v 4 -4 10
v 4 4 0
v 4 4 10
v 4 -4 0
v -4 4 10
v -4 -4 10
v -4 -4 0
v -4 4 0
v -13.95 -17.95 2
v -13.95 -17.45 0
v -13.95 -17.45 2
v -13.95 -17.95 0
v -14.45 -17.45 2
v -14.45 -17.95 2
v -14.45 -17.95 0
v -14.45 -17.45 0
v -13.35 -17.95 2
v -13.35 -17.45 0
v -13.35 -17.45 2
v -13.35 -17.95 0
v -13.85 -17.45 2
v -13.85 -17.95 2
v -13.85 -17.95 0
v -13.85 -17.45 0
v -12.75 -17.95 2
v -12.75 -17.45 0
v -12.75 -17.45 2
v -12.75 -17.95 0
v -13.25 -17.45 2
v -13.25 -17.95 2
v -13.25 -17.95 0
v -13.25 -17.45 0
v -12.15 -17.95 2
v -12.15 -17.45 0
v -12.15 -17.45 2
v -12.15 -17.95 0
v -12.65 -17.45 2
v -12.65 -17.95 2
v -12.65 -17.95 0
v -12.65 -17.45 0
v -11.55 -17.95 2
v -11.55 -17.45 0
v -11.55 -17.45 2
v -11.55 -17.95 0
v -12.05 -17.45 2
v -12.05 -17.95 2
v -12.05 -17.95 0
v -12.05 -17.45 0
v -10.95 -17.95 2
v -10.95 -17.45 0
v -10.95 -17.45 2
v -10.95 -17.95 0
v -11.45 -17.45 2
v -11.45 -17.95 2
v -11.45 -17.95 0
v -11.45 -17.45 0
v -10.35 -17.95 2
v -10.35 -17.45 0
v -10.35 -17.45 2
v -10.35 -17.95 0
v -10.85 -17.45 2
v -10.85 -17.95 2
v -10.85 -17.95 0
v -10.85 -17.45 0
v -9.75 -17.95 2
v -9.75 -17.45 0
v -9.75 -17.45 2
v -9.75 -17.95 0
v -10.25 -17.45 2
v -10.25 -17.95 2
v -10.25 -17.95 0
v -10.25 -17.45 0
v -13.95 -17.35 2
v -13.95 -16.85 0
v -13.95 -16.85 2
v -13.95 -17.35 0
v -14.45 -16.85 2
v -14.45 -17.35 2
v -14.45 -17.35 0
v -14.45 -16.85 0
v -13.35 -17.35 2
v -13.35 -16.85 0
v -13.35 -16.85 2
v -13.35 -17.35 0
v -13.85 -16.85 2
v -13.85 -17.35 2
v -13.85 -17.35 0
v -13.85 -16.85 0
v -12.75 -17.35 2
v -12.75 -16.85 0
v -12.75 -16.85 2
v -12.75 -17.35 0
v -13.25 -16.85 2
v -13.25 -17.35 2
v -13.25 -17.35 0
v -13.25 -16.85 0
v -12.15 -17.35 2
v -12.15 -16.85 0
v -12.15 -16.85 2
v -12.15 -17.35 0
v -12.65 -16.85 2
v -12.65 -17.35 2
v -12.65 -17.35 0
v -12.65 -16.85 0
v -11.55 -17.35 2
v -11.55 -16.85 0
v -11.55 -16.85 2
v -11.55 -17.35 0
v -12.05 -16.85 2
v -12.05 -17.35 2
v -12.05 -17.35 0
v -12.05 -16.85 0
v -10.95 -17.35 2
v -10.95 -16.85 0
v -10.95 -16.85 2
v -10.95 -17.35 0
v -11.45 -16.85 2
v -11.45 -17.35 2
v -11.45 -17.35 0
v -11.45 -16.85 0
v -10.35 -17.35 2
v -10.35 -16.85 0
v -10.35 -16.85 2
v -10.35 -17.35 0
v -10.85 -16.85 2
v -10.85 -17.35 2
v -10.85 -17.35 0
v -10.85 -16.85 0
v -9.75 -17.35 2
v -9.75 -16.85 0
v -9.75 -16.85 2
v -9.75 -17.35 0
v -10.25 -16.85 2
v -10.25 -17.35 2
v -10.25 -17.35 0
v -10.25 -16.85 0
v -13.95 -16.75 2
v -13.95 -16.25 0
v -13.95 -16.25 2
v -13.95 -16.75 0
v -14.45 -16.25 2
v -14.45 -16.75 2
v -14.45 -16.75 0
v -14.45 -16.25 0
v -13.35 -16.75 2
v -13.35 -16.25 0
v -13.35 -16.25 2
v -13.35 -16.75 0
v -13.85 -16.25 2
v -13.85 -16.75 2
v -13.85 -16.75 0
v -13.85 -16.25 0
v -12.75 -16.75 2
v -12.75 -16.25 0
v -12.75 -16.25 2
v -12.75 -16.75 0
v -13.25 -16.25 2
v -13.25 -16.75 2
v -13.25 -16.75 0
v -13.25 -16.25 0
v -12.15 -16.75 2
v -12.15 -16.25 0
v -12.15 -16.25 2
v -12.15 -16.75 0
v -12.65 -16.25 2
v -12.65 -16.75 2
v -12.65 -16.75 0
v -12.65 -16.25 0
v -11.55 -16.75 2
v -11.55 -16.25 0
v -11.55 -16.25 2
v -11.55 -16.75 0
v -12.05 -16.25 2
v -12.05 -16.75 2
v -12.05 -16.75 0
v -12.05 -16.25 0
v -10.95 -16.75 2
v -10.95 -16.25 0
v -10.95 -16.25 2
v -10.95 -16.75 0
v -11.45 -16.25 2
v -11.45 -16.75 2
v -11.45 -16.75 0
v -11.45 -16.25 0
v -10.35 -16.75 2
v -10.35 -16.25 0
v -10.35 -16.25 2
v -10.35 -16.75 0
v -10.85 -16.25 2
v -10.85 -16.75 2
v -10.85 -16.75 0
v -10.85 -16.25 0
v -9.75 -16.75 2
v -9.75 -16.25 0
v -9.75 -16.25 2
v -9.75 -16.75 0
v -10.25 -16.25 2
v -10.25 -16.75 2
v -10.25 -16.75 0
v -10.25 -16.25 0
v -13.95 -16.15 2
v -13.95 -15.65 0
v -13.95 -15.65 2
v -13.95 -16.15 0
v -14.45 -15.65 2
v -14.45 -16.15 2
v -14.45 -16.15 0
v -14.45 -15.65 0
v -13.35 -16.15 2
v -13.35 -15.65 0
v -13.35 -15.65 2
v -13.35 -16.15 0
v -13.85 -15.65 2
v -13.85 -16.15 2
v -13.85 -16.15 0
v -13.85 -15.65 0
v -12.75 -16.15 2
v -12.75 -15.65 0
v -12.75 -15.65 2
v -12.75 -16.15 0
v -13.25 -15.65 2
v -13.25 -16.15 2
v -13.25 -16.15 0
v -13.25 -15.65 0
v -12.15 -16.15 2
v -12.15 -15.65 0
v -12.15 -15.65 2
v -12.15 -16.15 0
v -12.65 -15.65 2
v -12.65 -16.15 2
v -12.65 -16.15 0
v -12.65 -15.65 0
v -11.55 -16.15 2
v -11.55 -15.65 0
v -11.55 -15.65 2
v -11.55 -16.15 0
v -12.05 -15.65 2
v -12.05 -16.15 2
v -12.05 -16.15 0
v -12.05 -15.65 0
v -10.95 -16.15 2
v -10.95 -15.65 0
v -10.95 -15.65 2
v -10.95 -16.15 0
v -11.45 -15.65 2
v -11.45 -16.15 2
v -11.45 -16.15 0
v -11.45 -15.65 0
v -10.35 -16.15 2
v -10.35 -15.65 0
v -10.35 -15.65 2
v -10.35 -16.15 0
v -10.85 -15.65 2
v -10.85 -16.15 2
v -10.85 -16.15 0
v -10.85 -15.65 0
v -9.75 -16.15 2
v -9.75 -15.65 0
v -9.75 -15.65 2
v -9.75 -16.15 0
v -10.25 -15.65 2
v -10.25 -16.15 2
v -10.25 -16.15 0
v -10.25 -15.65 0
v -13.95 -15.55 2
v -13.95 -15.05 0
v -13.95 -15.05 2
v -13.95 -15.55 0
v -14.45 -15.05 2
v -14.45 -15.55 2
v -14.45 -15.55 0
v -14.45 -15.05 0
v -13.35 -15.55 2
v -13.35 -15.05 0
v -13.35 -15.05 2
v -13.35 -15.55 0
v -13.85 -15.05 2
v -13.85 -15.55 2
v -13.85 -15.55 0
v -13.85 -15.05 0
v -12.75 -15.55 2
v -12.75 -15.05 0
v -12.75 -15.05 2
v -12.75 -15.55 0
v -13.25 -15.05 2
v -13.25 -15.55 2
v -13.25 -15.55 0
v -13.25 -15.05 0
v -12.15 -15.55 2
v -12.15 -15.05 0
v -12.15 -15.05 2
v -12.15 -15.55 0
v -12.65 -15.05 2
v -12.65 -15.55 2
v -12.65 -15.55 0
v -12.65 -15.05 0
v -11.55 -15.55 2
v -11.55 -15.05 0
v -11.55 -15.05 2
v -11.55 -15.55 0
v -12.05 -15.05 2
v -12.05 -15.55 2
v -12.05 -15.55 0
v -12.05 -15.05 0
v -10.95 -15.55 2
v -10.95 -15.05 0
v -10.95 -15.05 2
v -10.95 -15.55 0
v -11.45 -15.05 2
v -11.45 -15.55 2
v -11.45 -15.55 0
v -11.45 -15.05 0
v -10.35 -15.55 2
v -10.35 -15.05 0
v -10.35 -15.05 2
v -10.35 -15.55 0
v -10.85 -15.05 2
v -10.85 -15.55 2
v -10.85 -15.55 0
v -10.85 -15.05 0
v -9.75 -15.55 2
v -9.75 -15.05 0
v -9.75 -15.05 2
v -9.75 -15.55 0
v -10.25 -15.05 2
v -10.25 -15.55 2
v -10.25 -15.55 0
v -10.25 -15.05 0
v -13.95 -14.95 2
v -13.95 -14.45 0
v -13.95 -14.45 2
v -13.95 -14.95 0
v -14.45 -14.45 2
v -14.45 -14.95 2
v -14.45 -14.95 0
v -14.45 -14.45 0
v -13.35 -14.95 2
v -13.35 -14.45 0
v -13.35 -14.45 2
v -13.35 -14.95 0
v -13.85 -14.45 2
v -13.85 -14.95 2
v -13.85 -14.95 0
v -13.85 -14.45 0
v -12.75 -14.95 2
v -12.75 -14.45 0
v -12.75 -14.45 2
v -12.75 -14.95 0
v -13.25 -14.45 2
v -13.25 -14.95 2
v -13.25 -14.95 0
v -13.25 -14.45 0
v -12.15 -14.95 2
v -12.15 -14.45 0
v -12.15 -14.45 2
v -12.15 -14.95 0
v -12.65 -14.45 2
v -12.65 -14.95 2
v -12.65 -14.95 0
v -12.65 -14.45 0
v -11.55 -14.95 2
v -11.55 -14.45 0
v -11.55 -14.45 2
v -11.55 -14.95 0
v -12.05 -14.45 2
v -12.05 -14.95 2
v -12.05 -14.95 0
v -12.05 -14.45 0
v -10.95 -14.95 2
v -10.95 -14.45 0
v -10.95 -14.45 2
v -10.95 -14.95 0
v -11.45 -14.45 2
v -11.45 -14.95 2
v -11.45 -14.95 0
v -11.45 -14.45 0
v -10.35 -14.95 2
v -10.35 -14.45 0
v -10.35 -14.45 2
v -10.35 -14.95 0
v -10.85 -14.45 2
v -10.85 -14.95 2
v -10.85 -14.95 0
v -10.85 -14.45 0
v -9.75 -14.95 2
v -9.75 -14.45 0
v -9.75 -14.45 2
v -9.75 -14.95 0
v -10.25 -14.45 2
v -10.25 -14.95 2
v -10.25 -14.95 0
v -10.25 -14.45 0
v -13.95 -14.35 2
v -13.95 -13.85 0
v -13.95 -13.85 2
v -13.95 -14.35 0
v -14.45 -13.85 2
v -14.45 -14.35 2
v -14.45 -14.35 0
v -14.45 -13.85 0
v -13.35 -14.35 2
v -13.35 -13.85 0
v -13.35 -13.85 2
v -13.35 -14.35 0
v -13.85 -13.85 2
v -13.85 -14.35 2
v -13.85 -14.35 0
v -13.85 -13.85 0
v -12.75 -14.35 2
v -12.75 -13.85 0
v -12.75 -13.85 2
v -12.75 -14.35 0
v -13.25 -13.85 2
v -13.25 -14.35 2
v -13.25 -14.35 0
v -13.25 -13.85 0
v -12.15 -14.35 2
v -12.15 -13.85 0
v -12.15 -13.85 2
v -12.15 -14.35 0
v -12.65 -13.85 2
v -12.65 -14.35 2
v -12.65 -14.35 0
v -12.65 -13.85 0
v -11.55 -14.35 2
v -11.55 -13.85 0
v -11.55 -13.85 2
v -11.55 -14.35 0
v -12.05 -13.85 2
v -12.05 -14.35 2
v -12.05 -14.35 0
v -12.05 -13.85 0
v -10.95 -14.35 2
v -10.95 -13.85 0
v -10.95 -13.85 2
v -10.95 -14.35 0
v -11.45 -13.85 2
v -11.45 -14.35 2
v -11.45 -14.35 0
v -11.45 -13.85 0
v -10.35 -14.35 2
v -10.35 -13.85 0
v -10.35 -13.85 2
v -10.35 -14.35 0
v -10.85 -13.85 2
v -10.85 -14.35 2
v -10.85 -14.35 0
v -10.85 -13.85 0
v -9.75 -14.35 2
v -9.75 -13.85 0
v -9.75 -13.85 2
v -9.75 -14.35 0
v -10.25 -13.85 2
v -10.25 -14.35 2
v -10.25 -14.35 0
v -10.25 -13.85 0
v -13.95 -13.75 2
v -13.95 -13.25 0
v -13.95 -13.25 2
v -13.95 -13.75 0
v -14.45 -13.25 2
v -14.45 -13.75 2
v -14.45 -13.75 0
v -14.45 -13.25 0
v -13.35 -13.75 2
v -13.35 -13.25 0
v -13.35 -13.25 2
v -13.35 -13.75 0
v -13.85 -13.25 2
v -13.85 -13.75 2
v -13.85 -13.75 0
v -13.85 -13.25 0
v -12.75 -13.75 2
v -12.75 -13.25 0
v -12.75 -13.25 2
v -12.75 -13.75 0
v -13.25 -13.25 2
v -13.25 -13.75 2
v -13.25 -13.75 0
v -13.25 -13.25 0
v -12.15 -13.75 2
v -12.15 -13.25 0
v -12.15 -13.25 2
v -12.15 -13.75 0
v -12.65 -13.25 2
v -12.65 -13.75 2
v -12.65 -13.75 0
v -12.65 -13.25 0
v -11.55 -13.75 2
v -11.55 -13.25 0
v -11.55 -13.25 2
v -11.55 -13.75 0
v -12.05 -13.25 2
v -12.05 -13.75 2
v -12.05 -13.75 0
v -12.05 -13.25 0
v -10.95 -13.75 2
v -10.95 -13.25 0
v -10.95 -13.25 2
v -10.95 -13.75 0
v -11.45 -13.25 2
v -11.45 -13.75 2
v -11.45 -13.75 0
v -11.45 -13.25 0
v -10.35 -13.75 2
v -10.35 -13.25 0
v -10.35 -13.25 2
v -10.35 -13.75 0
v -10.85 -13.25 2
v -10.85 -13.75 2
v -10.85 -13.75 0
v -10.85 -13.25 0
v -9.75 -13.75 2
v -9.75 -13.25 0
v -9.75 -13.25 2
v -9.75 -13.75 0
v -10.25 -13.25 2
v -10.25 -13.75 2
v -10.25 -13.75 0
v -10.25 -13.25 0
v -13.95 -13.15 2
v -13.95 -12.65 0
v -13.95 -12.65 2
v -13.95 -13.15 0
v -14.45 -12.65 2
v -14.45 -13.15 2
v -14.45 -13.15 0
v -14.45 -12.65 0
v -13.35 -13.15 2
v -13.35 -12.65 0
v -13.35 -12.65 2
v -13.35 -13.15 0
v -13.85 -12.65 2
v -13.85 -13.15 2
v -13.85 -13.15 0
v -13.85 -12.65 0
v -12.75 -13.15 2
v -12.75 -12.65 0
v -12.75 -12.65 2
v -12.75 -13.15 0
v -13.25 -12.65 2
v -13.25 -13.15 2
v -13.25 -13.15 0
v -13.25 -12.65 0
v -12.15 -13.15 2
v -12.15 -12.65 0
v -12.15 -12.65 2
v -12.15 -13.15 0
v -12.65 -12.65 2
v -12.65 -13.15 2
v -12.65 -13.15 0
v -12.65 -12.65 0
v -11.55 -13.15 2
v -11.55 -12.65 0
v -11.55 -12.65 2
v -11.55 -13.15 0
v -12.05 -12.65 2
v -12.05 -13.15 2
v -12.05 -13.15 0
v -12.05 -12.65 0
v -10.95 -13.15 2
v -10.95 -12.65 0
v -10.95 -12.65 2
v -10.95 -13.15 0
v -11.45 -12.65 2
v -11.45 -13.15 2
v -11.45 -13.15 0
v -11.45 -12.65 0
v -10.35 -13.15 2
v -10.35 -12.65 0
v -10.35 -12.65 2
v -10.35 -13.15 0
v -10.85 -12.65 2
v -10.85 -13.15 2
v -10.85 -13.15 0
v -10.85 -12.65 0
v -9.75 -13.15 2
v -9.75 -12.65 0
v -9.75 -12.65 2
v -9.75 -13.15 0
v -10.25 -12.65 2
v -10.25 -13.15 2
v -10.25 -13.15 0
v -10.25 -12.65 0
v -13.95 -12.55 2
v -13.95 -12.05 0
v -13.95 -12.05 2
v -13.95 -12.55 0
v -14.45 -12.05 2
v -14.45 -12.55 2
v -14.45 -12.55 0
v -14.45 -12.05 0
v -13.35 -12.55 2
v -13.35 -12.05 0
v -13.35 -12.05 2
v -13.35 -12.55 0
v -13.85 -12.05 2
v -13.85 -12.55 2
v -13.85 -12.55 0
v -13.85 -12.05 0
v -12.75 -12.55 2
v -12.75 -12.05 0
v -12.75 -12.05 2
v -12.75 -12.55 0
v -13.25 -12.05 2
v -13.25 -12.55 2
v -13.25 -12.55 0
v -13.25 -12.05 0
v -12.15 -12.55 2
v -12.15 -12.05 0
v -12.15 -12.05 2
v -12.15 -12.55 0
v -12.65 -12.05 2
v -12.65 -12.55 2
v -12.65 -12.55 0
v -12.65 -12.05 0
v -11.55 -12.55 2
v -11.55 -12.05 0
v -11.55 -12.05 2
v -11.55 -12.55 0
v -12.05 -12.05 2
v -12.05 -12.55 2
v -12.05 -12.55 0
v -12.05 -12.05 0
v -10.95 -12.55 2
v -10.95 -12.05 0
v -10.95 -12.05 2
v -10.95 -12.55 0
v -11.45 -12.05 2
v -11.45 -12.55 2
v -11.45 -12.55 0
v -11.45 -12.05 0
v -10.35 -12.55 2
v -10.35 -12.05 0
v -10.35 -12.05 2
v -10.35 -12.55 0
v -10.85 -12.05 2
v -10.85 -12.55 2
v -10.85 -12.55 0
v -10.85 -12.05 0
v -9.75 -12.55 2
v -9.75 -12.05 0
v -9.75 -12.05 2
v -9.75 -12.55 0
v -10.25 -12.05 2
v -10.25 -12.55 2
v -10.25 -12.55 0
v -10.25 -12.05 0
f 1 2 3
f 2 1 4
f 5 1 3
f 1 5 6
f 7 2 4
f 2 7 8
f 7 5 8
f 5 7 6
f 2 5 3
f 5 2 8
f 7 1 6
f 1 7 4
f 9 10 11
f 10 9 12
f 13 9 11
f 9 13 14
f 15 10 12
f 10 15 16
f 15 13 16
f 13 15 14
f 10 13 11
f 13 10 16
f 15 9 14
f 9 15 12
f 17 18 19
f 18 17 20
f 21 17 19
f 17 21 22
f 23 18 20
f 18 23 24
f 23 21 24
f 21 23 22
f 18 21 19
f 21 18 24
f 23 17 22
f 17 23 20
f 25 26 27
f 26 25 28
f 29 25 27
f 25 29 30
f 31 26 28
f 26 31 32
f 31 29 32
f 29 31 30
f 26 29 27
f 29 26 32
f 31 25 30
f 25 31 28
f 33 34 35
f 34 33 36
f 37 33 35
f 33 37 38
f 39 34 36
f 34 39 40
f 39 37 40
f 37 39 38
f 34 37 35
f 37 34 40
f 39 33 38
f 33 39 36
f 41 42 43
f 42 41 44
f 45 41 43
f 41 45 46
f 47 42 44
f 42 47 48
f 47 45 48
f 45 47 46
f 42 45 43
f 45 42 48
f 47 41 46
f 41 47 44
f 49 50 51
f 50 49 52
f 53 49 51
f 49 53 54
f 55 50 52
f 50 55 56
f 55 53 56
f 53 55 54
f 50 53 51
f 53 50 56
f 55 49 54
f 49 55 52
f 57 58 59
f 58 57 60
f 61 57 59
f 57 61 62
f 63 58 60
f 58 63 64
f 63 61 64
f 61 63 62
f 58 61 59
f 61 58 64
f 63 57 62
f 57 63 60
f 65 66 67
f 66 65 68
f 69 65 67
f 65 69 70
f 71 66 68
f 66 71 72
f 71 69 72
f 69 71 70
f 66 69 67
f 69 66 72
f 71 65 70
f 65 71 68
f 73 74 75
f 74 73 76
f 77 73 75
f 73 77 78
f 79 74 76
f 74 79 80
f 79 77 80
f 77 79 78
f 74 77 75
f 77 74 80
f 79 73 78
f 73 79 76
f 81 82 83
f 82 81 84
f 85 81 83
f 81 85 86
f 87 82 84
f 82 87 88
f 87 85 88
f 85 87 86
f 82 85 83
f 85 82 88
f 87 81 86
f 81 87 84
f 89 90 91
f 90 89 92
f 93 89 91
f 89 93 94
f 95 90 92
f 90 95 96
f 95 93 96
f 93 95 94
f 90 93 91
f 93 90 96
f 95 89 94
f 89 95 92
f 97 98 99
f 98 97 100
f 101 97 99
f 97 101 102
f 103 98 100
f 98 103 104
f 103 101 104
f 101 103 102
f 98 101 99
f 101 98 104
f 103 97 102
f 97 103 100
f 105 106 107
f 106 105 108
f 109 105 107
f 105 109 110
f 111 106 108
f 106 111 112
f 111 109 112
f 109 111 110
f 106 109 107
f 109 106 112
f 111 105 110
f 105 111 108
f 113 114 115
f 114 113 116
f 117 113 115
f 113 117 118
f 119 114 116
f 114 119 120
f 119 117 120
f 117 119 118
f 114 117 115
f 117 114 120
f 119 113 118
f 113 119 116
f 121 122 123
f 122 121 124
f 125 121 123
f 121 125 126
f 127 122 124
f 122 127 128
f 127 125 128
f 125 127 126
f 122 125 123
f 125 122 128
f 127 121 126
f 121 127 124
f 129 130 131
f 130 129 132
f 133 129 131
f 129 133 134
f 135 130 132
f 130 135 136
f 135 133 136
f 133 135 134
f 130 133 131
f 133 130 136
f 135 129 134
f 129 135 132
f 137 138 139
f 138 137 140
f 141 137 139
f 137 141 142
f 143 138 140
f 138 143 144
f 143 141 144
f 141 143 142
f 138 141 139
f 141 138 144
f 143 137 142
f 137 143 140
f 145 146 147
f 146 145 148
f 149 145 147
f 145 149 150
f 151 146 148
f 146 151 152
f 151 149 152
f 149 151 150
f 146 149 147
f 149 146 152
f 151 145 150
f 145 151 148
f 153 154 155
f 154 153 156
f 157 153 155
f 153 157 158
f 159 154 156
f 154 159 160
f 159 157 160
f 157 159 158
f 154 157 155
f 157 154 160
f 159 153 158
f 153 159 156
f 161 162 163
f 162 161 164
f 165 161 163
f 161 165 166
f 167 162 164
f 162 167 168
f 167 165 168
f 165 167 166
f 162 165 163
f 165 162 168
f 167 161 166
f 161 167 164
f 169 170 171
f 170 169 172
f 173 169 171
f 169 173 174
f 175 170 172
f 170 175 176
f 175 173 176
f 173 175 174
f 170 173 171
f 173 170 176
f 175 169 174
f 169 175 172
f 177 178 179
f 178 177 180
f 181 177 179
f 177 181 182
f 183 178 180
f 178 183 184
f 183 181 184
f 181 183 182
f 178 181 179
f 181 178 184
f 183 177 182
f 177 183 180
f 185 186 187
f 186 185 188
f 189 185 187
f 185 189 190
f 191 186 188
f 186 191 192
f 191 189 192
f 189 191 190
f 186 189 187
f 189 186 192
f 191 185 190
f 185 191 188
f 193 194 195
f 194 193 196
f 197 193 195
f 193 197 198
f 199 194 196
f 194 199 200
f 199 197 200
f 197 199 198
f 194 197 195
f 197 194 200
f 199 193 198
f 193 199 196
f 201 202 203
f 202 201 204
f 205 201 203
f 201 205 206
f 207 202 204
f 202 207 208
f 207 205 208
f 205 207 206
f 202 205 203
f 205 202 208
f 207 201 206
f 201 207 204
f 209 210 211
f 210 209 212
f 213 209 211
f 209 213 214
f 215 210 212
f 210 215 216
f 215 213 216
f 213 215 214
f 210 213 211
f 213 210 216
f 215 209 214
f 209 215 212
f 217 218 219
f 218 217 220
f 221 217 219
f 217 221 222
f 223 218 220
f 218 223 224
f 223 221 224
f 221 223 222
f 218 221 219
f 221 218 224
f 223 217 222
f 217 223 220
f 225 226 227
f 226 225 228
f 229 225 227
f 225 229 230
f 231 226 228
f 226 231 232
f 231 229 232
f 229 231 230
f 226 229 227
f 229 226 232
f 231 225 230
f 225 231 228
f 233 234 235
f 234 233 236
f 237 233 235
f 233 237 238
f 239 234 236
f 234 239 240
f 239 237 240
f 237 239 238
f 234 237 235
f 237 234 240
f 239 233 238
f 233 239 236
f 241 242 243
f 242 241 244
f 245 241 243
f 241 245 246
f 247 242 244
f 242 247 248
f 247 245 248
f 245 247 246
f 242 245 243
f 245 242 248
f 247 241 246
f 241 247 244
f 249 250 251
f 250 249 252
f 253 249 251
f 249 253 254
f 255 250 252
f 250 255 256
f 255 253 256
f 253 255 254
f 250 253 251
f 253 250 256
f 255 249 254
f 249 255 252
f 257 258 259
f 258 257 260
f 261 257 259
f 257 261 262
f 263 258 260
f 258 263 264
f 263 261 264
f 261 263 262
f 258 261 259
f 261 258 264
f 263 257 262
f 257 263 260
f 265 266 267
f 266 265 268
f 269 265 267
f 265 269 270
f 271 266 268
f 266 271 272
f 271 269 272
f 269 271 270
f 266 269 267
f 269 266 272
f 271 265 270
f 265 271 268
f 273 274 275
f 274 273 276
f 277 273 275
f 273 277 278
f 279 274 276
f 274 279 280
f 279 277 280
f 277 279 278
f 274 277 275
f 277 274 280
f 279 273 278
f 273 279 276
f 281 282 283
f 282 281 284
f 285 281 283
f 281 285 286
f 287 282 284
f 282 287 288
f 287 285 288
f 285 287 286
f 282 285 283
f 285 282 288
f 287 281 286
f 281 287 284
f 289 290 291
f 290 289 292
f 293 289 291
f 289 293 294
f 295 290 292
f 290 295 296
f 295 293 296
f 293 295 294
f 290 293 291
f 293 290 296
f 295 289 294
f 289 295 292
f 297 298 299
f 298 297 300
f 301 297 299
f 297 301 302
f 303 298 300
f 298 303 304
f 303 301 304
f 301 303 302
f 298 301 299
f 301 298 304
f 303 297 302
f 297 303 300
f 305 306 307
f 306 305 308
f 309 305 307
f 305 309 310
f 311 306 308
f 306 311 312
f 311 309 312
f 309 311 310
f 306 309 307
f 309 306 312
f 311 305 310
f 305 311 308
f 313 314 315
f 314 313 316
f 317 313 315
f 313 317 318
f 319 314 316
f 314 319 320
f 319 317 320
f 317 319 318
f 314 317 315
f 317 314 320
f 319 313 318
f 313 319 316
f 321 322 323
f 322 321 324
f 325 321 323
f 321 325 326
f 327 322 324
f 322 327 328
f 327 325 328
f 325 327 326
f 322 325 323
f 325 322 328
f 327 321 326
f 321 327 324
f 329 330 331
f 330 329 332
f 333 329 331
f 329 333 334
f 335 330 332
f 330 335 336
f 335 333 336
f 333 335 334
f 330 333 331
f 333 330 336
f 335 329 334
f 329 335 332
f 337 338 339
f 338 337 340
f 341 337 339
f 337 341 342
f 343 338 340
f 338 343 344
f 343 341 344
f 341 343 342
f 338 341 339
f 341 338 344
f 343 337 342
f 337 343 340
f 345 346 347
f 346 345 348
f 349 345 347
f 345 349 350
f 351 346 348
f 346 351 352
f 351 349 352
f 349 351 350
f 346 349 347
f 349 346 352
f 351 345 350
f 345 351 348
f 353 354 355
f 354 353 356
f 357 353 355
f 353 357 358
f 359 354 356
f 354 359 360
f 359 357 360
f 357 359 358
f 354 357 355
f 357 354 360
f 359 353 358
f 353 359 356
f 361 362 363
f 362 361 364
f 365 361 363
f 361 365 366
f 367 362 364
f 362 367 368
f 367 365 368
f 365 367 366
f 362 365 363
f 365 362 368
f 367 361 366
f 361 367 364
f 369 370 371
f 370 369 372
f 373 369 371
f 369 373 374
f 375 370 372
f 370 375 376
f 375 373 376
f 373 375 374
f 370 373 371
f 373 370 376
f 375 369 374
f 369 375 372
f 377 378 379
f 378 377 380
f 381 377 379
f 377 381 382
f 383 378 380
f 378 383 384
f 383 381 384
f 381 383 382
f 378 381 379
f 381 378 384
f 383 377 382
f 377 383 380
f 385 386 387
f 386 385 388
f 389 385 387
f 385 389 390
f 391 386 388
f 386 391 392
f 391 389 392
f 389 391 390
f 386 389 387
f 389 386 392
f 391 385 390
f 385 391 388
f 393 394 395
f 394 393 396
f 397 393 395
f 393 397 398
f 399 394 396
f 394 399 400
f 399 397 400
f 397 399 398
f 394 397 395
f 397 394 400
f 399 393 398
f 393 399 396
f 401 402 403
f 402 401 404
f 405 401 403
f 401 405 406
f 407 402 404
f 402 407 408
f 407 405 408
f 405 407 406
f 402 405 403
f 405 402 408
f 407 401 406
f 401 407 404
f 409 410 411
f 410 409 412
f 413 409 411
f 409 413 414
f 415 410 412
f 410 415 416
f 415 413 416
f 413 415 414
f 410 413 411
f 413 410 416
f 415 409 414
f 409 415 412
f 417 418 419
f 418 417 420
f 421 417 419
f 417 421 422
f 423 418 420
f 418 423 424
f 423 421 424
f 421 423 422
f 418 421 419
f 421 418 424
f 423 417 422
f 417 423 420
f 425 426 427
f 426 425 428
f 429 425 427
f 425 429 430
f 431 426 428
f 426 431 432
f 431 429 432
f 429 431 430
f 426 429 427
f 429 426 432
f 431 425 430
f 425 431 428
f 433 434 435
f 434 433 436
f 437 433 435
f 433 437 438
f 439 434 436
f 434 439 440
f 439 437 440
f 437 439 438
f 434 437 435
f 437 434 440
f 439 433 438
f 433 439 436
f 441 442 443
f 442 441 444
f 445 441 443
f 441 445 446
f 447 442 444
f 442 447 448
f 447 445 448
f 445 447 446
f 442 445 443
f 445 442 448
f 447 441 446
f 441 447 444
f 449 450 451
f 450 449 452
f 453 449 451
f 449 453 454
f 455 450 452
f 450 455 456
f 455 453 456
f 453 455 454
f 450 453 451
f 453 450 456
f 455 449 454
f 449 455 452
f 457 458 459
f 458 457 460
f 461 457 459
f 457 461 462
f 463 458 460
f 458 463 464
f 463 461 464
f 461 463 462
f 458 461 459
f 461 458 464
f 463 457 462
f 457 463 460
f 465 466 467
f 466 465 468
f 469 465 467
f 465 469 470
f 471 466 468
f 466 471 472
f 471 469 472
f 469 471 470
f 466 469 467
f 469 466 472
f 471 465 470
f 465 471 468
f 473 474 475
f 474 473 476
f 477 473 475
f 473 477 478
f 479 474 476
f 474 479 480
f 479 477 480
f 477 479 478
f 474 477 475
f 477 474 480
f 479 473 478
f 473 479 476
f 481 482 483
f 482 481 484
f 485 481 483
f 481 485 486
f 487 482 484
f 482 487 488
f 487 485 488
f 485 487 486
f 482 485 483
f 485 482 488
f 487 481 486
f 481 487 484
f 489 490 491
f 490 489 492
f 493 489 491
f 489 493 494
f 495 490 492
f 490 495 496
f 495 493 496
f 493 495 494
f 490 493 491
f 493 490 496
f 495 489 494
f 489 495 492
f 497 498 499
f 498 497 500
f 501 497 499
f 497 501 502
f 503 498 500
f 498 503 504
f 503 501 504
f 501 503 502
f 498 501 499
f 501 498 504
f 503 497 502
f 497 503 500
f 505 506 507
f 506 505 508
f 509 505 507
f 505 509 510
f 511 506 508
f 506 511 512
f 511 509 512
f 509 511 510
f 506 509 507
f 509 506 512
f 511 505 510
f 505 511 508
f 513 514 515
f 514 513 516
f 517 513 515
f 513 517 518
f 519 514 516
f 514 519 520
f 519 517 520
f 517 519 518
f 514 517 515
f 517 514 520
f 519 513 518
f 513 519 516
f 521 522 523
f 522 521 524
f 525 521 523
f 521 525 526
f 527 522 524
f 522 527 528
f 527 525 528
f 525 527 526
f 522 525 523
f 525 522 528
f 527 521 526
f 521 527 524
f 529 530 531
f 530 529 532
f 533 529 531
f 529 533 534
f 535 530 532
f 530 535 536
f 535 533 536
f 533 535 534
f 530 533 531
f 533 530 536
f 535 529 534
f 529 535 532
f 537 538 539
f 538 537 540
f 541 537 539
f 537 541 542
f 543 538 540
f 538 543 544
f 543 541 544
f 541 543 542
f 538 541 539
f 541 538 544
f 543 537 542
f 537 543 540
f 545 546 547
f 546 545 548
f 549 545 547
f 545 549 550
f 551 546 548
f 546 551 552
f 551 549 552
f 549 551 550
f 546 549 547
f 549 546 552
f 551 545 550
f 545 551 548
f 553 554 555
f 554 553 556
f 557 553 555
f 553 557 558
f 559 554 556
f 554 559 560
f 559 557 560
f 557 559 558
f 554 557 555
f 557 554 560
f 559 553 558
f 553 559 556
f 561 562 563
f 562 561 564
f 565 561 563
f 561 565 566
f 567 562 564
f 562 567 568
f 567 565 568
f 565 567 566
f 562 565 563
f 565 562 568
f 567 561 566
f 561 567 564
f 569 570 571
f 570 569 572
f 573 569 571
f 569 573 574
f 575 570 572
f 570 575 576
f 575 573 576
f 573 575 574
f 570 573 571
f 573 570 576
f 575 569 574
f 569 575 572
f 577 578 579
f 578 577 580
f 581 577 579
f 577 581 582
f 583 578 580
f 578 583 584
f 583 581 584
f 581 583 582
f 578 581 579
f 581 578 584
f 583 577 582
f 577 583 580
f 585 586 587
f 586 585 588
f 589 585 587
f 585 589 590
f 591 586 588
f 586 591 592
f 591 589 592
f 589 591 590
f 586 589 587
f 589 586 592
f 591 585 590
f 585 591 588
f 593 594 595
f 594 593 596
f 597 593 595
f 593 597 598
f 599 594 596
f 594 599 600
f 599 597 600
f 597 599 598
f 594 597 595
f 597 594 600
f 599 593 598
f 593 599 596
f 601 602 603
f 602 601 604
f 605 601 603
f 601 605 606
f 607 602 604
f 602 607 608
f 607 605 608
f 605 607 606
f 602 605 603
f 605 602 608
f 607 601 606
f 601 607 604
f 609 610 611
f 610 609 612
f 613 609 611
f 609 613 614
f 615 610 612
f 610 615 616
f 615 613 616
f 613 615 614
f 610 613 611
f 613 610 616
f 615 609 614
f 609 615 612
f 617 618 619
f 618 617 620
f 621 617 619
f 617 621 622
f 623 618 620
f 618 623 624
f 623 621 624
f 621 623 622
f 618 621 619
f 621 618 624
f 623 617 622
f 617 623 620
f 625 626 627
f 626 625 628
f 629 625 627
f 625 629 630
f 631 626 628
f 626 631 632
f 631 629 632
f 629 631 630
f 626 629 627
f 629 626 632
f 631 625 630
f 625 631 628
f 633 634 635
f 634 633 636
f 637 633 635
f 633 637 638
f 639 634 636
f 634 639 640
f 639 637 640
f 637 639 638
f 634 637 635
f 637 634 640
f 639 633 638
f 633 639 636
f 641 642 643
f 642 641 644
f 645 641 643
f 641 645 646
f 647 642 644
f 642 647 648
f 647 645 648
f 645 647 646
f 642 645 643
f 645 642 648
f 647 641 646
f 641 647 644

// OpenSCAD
translate([0, 0, 5]) color([0,1,0,0.9]) cube([8, 8, 10], center=true);
translate([-14.2, -17.7, 1]) color([1,0,0]) cube([0.5, 0.5, 2], center=true);
translate([-13.6, -17.7, 1]) color([1,0,0]) cube([0.5, 0.5, 2], center=true);
translate([-13, -17.7, 1]) color([1,0,0]) cube([0.5, 0.5, 2], center=true);
translate([-12.4, -17.7, 1]) color([1,0,0]) cube([0.5, 0.5, 2], center=true);
translate([-11.8, -17.7, 1]) color([1,0,0]) cube([0.5, 0.5, 2], center=true);
translate([-11.2, -17.7, 1]) color([1,0,0]) cube([0.5, 0.5, 2], center=true);
translate([-10.6, -17.7, 1]) color([1,0,0]) cube([0.5, 0.5, 2], center=true);
translate([-10, -17.7, 1]) color([1,0,0]) cube([0.5, 0.5, 2], center=true);
translate([-14.2, -17.1, 1]) color([1,0,0]) cube([0.5, 0.5, 2], center=true);
translate([-13.6, -17.1, 1]) color([1,0,0]) cube([0.5, 0.5, 2], center=true);
translate([-13, -17.1, 1]) color([1,0,0]) cube([0.5, 0.5, 2], center=true);
translate([-12.4, -17.1, 1]) color([1,0,0]) cube([0.5, 0.5, 2], center=true);
translate([-11.8, -17.1, 1]) color([1,0,0]) cube([0.5, 0.5, 2], center=true);
translate([-11.2, -17.1, 1]) color([1,0,0]) cube([0.5, 0.5, 2], center=true);
translate([-10.6, -17.1, 1]) color([1,0,0]) cube([0.5, 0.5, 2], center=true);
translate([-10, -17.1, 1]) color([1,0,0]) cube([0.5, 0.5, 2], center=true);
translate([-14.2, -16.5, 1]) color([1,0,0]) cube([0.5, 0.5, 2], center=true);
translate([-13.6, -16.5, 1]) color([1,0,0]) cube([0.5, 0.5, 2], center=true);
translate([-13, -16.5, 1]) color([1,0,0]) cube([0.5, 0.5, 2], center=true);
translate([-12.4, -16.5, 1]) color([1,0,0]) cube([0.5, 0.5, 2], center=true);
translate([-11.8, -16.5, 1]) color([1,0,0]) cube([0.5, 0.5, 2], center=true);
translate([-11.2, -16.5, 1]) color([1,0,0]) cube([0.5, 0.5, 2], center=true);
translate([-10.6, -16.5, 1]) color([1,0,0]) cube([0.5, 0.5, 2], center=true);
translate([-10, -16.5, 1]) color([1,0,0]) cube([0.5, 0.5, 2], center=true);
translate([-14.2, -15.9, 1]) color([1,0,0]) cube([0.5, 0.5, 2], center=true);
translate([-13.6, -15.9, 1]) color([1,0,0]) cube([0.5, 0.5, 2], center=true);
translate([-13, -15.9, 1]) color([1,0,0]) cube([0.5, 0.5, 2], center=true);
translate([-12.4, -15.9, 1]) color([1,0,0]) cube([0.5, 0.5, 2], center=true);
translate([-11.8, -15.9, 1]) color([1,0,0]) cube([0.5, 0.5, 2], center=true);
translate([-11.2, -15.9, 1]) color([1,0,0]) cube([0.5, 0.5, 2], center=true);
translate([-10.6, -15.9, 1]) color([1,0,0]) cube([0.5, 0.5, 2], center=true);
translate([-10, -15.9, 1]) color([1,0,0]) cube([0.5, 0.5, 2], center=true);
translate([-14.2, -15.3, 1]) color([1,0,0]) cube([0.5, 0.5, 2], center=true);
translate([-13.6, -15.3, 1]) color([1,0,0]) cube([0.5, 0.5, 2], center=true);
translate([-13, -15.3, 1]) color([1,0,0]) cube([0.5, 0.5, 2], center=true);
translate([-12.4, -15.3, 1]) color([1,0,0]) cube([0.5, 0.5, 2], center=true);
translate([-11.8, -15.3, 1]) color([1,0,0]) cube([0.5, 0.5, 2], center=true);
translate([-11.2, -15.3, 1]) color([1,0,0]) cube([0.5, 0.5, 2], center=true);
translate([-10.6, -15.3, 1]) color([1,0,0]) cube([0.5, 0.5, 2], center=true);
translate([-10, -15.3, 1]) color([1,0,0]) cube([0.5, 0.5, 2], center=true);
translate([-14.2, -14.7, 1]) color([1,0,0]) cube([0.5, 0.5, 2], center=true);
translate([-13.6, -14.7, 1]) color([1,0,0]) cube([0.5, 0.5, 2], center=true);
translate([-13, -14.7, 1]) color([1,0,0]) cube([0.5, 0.5, 2], center=true);
translate([-12.4, -14.7, 1]) color([1,0,0]) cube([0.5, 0.5, 2], center=true);
translate([-11.8, -14.7, 1]) color([1,0,0]) cube([0.5, 0.5, 2], center=true);
translate([-11.2, -14.7, 1]) color([1,0,0]) cube([0.5, 0.5, 2], center=true);
translate([-10.6, -14.7, 1]) color([1,0,0]) cube([0.5, 0.5, 2], center=true);
translate([-10, -14.7, 1]) color([1,0,0]) cube([0.5, 0.5, 2], center=true);
translate([-14.2, -14.1, 1]) color([1,0,0]) cube([0.5, 0.5, 2], center=true);
translate([-13.6, -14.1, 1]) color([1,0,0]) cube([0.5, 0.5, 2], center=true);
translate([-13, -14.1, 1]) color([1,0,0]) cube([0.5, 0.5, 2], center=true);
translate([-12.4, -14.1, 1]) color([1,0,0]) cube([0.5, 0.5, 2], center=true);
translate([-11.8, -14.1, 1]) color([1,0,0]) cube([0.5, 0.5, 2], center=true);
translate([-11.2, -14.1, 1]) color([1,0,0]) cube([0.5, 0.5, 2], center=true);
translate([-10.6, -14.1, 1]) color([1,0,0]) cube([0.5, 0.5, 2], center=true);
translate([-10, -14.1, 1]) color([1,0,0]) cube([0.5, 0.5, 2], center=true);
translate([-14.2, -13.5, 1]) color([1,0,0]) cube([0.5, 0.5, 2], center=true);
translate([-13.6, -13.5, 1]) color([1,0,0]) cube([0.5, 0.5, 2], center=true);
translate([-13, -13.5, 1]) color([1,0,0]) cube([0.5, 0.5, 2], center=true);
translate([-12.4, -13.5, 1]) color([1,0,0]) cube([0.5, 0.5, 2], center=true);
translate([-11.8, -13.5, 1]) color([1,0,0]) cube([0.5, 0.5, 2], center=true);
translate([-11.2, -13.5, 1]) color([1,0,0]) cube([0.5, 0.5, 2], center=true);
translate([-10.6, -13.5, 1]) color([1,0,0]) cube([0.5, 0.5, 2], center=true);
translate([-10, -13.5, 1]) color([1,0,0]) cube([0.5, 0.5, 2], center=true);
translate([-14.2, -12.9, 1]) color([1,0,0]) cube([0.5, 0.5, 2], center=true);
translate([-13.6, -12.9, 1]) color([1,0,0]) cube([0.5, 0.5, 2], center=true);
translate([-13, -12.9, 1]) color([1,0,0]) cube([0.5, 0.5, 2], center=true);
translate([-12.4, -12.9, 1]) color([1,0,0]) cube([0.5, 0.5, 2], center=true);
translate([-11.8, -12.9, 1]) color([1,0,0]) cube([0.5, 0.5, 2], center=true);
translate([-11.2, -12.9, 1]) color([1,0,0]) cube([0.5, 0.5, 2], center=true);
translate([-10.6, -12.9, 1]) color([1,0,0]) cube([0.5, 0.5, 2], center=true);
translate([-10, -12.9, 1]) color([1,0,0]) cube([0.5, 0.5, 2], center=true);
translate([-14.2, -12.3, 1]) color([1,0,0]) cube([0.5, 0.5, 2], center=true);
translate([-13.6, -12.3, 1]) color([1,0,0]) cube([0.5, 0.5, 2], center=true);
translate([-13, -12.3, 1]) color([1,0,0]) cube([0.5, 0.5, 2], center=true);
translate([-12.4, -12.3, 1]) color([1,0,0]) cube([0.5, 0.5, 2], center=true);
translate([-11.8, -12.3, 1]) color([1,0,0]) cube([0.5, 0.5, 2], center=true);
translate([-11.2, -12.3, 1]) color([1,0,0]) cube([0.5, 0.5, 2], center=true);
translate([-10.6, -12.3, 1]) color([1,0,0]) cube([0.5, 0.5, 2], center=true);
translate([-10, -12.3, 1]) color([1,0,0]) cube([0.5, 0.5, 2], center=true);
